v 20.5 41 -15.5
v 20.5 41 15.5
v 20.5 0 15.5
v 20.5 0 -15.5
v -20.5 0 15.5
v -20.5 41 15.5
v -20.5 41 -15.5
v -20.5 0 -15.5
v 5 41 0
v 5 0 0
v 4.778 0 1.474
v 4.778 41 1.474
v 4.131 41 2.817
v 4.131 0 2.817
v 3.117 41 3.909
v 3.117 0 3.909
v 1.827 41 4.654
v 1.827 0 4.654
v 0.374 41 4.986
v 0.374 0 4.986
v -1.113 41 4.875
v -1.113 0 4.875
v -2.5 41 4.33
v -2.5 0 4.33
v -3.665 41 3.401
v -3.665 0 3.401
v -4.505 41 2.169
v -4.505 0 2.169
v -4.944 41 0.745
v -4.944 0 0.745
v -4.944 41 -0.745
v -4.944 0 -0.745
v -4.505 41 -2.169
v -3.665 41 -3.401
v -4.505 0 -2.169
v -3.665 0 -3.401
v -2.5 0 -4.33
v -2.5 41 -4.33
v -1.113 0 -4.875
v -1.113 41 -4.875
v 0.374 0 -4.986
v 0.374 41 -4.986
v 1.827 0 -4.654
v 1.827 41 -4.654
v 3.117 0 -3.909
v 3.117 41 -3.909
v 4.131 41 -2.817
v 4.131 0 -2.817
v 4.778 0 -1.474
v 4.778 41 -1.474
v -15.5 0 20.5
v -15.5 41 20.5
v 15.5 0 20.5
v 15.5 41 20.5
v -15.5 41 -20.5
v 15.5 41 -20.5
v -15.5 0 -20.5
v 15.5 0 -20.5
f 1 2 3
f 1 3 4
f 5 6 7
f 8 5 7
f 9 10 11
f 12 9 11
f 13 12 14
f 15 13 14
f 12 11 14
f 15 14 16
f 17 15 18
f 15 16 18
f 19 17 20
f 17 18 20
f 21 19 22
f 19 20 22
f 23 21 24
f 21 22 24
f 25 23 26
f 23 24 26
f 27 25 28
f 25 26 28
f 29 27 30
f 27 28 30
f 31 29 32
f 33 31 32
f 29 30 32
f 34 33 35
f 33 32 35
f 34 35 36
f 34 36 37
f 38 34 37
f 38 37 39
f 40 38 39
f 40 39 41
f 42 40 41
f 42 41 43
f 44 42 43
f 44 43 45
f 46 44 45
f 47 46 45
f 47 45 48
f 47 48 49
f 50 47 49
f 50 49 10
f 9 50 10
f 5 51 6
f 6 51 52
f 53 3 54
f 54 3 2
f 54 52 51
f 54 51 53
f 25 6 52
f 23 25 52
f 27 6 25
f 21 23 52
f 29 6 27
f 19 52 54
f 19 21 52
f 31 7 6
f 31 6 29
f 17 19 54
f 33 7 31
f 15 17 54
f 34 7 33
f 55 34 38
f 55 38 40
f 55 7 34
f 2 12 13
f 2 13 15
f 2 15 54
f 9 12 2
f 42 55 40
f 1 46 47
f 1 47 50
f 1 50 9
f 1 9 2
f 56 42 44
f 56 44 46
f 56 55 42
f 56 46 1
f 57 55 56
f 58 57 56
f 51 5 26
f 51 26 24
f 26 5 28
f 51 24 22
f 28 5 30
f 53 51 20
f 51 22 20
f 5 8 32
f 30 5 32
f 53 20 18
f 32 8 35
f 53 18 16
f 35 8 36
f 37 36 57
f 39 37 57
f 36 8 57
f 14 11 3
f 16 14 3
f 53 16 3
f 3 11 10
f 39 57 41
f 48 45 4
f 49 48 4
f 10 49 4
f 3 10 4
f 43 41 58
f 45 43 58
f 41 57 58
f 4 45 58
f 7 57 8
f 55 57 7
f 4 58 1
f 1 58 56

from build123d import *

# Parameters (mm, degrees)
SKETCH1_W           = 41
SKETCH1_H           = 41
BOSS_EXTRUDE1_DEPTH = 41
CHAMFER1_SIZE       = 5
SKETCH2_R           = 5
CUT_EXTRUDE1_DEPTH  = 42


with BuildPart() as part:
    # Sketch1 → Boss-Extrude1 (new body)
    with BuildSketch(Plane(origin=(0, 0, 0), x_dir=(1, 0, 0), z_dir=(0, 1, 0))):
        Rectangle(SKETCH1_W, SKETCH1_H)
    extrude(amount=BOSS_EXTRUDE1_DEPTH)

    # Chamfer1
    chamfer1_edges = [part.edges().sort_by_distance(p)[0] for p in [
        (20.5, 20.5, 20.5),
        (-20.5, 20.5, 20.5),
        (-20.5, 20.5, -20.5),
        (20.5, 20.5, -20.5),
    ]]
    chamfer(chamfer1_edges, length=CHAMFER1_SIZE)

    # Sketch2 → Cut-Extrude1 (cut, through all)
    with BuildSketch(Plane.XZ):
        Circle(SKETCH2_R)
    extrude(amount=-CUT_EXTRUDE1_DEPTH, mode=Mode.SUBTRACT)


solid = part.part
